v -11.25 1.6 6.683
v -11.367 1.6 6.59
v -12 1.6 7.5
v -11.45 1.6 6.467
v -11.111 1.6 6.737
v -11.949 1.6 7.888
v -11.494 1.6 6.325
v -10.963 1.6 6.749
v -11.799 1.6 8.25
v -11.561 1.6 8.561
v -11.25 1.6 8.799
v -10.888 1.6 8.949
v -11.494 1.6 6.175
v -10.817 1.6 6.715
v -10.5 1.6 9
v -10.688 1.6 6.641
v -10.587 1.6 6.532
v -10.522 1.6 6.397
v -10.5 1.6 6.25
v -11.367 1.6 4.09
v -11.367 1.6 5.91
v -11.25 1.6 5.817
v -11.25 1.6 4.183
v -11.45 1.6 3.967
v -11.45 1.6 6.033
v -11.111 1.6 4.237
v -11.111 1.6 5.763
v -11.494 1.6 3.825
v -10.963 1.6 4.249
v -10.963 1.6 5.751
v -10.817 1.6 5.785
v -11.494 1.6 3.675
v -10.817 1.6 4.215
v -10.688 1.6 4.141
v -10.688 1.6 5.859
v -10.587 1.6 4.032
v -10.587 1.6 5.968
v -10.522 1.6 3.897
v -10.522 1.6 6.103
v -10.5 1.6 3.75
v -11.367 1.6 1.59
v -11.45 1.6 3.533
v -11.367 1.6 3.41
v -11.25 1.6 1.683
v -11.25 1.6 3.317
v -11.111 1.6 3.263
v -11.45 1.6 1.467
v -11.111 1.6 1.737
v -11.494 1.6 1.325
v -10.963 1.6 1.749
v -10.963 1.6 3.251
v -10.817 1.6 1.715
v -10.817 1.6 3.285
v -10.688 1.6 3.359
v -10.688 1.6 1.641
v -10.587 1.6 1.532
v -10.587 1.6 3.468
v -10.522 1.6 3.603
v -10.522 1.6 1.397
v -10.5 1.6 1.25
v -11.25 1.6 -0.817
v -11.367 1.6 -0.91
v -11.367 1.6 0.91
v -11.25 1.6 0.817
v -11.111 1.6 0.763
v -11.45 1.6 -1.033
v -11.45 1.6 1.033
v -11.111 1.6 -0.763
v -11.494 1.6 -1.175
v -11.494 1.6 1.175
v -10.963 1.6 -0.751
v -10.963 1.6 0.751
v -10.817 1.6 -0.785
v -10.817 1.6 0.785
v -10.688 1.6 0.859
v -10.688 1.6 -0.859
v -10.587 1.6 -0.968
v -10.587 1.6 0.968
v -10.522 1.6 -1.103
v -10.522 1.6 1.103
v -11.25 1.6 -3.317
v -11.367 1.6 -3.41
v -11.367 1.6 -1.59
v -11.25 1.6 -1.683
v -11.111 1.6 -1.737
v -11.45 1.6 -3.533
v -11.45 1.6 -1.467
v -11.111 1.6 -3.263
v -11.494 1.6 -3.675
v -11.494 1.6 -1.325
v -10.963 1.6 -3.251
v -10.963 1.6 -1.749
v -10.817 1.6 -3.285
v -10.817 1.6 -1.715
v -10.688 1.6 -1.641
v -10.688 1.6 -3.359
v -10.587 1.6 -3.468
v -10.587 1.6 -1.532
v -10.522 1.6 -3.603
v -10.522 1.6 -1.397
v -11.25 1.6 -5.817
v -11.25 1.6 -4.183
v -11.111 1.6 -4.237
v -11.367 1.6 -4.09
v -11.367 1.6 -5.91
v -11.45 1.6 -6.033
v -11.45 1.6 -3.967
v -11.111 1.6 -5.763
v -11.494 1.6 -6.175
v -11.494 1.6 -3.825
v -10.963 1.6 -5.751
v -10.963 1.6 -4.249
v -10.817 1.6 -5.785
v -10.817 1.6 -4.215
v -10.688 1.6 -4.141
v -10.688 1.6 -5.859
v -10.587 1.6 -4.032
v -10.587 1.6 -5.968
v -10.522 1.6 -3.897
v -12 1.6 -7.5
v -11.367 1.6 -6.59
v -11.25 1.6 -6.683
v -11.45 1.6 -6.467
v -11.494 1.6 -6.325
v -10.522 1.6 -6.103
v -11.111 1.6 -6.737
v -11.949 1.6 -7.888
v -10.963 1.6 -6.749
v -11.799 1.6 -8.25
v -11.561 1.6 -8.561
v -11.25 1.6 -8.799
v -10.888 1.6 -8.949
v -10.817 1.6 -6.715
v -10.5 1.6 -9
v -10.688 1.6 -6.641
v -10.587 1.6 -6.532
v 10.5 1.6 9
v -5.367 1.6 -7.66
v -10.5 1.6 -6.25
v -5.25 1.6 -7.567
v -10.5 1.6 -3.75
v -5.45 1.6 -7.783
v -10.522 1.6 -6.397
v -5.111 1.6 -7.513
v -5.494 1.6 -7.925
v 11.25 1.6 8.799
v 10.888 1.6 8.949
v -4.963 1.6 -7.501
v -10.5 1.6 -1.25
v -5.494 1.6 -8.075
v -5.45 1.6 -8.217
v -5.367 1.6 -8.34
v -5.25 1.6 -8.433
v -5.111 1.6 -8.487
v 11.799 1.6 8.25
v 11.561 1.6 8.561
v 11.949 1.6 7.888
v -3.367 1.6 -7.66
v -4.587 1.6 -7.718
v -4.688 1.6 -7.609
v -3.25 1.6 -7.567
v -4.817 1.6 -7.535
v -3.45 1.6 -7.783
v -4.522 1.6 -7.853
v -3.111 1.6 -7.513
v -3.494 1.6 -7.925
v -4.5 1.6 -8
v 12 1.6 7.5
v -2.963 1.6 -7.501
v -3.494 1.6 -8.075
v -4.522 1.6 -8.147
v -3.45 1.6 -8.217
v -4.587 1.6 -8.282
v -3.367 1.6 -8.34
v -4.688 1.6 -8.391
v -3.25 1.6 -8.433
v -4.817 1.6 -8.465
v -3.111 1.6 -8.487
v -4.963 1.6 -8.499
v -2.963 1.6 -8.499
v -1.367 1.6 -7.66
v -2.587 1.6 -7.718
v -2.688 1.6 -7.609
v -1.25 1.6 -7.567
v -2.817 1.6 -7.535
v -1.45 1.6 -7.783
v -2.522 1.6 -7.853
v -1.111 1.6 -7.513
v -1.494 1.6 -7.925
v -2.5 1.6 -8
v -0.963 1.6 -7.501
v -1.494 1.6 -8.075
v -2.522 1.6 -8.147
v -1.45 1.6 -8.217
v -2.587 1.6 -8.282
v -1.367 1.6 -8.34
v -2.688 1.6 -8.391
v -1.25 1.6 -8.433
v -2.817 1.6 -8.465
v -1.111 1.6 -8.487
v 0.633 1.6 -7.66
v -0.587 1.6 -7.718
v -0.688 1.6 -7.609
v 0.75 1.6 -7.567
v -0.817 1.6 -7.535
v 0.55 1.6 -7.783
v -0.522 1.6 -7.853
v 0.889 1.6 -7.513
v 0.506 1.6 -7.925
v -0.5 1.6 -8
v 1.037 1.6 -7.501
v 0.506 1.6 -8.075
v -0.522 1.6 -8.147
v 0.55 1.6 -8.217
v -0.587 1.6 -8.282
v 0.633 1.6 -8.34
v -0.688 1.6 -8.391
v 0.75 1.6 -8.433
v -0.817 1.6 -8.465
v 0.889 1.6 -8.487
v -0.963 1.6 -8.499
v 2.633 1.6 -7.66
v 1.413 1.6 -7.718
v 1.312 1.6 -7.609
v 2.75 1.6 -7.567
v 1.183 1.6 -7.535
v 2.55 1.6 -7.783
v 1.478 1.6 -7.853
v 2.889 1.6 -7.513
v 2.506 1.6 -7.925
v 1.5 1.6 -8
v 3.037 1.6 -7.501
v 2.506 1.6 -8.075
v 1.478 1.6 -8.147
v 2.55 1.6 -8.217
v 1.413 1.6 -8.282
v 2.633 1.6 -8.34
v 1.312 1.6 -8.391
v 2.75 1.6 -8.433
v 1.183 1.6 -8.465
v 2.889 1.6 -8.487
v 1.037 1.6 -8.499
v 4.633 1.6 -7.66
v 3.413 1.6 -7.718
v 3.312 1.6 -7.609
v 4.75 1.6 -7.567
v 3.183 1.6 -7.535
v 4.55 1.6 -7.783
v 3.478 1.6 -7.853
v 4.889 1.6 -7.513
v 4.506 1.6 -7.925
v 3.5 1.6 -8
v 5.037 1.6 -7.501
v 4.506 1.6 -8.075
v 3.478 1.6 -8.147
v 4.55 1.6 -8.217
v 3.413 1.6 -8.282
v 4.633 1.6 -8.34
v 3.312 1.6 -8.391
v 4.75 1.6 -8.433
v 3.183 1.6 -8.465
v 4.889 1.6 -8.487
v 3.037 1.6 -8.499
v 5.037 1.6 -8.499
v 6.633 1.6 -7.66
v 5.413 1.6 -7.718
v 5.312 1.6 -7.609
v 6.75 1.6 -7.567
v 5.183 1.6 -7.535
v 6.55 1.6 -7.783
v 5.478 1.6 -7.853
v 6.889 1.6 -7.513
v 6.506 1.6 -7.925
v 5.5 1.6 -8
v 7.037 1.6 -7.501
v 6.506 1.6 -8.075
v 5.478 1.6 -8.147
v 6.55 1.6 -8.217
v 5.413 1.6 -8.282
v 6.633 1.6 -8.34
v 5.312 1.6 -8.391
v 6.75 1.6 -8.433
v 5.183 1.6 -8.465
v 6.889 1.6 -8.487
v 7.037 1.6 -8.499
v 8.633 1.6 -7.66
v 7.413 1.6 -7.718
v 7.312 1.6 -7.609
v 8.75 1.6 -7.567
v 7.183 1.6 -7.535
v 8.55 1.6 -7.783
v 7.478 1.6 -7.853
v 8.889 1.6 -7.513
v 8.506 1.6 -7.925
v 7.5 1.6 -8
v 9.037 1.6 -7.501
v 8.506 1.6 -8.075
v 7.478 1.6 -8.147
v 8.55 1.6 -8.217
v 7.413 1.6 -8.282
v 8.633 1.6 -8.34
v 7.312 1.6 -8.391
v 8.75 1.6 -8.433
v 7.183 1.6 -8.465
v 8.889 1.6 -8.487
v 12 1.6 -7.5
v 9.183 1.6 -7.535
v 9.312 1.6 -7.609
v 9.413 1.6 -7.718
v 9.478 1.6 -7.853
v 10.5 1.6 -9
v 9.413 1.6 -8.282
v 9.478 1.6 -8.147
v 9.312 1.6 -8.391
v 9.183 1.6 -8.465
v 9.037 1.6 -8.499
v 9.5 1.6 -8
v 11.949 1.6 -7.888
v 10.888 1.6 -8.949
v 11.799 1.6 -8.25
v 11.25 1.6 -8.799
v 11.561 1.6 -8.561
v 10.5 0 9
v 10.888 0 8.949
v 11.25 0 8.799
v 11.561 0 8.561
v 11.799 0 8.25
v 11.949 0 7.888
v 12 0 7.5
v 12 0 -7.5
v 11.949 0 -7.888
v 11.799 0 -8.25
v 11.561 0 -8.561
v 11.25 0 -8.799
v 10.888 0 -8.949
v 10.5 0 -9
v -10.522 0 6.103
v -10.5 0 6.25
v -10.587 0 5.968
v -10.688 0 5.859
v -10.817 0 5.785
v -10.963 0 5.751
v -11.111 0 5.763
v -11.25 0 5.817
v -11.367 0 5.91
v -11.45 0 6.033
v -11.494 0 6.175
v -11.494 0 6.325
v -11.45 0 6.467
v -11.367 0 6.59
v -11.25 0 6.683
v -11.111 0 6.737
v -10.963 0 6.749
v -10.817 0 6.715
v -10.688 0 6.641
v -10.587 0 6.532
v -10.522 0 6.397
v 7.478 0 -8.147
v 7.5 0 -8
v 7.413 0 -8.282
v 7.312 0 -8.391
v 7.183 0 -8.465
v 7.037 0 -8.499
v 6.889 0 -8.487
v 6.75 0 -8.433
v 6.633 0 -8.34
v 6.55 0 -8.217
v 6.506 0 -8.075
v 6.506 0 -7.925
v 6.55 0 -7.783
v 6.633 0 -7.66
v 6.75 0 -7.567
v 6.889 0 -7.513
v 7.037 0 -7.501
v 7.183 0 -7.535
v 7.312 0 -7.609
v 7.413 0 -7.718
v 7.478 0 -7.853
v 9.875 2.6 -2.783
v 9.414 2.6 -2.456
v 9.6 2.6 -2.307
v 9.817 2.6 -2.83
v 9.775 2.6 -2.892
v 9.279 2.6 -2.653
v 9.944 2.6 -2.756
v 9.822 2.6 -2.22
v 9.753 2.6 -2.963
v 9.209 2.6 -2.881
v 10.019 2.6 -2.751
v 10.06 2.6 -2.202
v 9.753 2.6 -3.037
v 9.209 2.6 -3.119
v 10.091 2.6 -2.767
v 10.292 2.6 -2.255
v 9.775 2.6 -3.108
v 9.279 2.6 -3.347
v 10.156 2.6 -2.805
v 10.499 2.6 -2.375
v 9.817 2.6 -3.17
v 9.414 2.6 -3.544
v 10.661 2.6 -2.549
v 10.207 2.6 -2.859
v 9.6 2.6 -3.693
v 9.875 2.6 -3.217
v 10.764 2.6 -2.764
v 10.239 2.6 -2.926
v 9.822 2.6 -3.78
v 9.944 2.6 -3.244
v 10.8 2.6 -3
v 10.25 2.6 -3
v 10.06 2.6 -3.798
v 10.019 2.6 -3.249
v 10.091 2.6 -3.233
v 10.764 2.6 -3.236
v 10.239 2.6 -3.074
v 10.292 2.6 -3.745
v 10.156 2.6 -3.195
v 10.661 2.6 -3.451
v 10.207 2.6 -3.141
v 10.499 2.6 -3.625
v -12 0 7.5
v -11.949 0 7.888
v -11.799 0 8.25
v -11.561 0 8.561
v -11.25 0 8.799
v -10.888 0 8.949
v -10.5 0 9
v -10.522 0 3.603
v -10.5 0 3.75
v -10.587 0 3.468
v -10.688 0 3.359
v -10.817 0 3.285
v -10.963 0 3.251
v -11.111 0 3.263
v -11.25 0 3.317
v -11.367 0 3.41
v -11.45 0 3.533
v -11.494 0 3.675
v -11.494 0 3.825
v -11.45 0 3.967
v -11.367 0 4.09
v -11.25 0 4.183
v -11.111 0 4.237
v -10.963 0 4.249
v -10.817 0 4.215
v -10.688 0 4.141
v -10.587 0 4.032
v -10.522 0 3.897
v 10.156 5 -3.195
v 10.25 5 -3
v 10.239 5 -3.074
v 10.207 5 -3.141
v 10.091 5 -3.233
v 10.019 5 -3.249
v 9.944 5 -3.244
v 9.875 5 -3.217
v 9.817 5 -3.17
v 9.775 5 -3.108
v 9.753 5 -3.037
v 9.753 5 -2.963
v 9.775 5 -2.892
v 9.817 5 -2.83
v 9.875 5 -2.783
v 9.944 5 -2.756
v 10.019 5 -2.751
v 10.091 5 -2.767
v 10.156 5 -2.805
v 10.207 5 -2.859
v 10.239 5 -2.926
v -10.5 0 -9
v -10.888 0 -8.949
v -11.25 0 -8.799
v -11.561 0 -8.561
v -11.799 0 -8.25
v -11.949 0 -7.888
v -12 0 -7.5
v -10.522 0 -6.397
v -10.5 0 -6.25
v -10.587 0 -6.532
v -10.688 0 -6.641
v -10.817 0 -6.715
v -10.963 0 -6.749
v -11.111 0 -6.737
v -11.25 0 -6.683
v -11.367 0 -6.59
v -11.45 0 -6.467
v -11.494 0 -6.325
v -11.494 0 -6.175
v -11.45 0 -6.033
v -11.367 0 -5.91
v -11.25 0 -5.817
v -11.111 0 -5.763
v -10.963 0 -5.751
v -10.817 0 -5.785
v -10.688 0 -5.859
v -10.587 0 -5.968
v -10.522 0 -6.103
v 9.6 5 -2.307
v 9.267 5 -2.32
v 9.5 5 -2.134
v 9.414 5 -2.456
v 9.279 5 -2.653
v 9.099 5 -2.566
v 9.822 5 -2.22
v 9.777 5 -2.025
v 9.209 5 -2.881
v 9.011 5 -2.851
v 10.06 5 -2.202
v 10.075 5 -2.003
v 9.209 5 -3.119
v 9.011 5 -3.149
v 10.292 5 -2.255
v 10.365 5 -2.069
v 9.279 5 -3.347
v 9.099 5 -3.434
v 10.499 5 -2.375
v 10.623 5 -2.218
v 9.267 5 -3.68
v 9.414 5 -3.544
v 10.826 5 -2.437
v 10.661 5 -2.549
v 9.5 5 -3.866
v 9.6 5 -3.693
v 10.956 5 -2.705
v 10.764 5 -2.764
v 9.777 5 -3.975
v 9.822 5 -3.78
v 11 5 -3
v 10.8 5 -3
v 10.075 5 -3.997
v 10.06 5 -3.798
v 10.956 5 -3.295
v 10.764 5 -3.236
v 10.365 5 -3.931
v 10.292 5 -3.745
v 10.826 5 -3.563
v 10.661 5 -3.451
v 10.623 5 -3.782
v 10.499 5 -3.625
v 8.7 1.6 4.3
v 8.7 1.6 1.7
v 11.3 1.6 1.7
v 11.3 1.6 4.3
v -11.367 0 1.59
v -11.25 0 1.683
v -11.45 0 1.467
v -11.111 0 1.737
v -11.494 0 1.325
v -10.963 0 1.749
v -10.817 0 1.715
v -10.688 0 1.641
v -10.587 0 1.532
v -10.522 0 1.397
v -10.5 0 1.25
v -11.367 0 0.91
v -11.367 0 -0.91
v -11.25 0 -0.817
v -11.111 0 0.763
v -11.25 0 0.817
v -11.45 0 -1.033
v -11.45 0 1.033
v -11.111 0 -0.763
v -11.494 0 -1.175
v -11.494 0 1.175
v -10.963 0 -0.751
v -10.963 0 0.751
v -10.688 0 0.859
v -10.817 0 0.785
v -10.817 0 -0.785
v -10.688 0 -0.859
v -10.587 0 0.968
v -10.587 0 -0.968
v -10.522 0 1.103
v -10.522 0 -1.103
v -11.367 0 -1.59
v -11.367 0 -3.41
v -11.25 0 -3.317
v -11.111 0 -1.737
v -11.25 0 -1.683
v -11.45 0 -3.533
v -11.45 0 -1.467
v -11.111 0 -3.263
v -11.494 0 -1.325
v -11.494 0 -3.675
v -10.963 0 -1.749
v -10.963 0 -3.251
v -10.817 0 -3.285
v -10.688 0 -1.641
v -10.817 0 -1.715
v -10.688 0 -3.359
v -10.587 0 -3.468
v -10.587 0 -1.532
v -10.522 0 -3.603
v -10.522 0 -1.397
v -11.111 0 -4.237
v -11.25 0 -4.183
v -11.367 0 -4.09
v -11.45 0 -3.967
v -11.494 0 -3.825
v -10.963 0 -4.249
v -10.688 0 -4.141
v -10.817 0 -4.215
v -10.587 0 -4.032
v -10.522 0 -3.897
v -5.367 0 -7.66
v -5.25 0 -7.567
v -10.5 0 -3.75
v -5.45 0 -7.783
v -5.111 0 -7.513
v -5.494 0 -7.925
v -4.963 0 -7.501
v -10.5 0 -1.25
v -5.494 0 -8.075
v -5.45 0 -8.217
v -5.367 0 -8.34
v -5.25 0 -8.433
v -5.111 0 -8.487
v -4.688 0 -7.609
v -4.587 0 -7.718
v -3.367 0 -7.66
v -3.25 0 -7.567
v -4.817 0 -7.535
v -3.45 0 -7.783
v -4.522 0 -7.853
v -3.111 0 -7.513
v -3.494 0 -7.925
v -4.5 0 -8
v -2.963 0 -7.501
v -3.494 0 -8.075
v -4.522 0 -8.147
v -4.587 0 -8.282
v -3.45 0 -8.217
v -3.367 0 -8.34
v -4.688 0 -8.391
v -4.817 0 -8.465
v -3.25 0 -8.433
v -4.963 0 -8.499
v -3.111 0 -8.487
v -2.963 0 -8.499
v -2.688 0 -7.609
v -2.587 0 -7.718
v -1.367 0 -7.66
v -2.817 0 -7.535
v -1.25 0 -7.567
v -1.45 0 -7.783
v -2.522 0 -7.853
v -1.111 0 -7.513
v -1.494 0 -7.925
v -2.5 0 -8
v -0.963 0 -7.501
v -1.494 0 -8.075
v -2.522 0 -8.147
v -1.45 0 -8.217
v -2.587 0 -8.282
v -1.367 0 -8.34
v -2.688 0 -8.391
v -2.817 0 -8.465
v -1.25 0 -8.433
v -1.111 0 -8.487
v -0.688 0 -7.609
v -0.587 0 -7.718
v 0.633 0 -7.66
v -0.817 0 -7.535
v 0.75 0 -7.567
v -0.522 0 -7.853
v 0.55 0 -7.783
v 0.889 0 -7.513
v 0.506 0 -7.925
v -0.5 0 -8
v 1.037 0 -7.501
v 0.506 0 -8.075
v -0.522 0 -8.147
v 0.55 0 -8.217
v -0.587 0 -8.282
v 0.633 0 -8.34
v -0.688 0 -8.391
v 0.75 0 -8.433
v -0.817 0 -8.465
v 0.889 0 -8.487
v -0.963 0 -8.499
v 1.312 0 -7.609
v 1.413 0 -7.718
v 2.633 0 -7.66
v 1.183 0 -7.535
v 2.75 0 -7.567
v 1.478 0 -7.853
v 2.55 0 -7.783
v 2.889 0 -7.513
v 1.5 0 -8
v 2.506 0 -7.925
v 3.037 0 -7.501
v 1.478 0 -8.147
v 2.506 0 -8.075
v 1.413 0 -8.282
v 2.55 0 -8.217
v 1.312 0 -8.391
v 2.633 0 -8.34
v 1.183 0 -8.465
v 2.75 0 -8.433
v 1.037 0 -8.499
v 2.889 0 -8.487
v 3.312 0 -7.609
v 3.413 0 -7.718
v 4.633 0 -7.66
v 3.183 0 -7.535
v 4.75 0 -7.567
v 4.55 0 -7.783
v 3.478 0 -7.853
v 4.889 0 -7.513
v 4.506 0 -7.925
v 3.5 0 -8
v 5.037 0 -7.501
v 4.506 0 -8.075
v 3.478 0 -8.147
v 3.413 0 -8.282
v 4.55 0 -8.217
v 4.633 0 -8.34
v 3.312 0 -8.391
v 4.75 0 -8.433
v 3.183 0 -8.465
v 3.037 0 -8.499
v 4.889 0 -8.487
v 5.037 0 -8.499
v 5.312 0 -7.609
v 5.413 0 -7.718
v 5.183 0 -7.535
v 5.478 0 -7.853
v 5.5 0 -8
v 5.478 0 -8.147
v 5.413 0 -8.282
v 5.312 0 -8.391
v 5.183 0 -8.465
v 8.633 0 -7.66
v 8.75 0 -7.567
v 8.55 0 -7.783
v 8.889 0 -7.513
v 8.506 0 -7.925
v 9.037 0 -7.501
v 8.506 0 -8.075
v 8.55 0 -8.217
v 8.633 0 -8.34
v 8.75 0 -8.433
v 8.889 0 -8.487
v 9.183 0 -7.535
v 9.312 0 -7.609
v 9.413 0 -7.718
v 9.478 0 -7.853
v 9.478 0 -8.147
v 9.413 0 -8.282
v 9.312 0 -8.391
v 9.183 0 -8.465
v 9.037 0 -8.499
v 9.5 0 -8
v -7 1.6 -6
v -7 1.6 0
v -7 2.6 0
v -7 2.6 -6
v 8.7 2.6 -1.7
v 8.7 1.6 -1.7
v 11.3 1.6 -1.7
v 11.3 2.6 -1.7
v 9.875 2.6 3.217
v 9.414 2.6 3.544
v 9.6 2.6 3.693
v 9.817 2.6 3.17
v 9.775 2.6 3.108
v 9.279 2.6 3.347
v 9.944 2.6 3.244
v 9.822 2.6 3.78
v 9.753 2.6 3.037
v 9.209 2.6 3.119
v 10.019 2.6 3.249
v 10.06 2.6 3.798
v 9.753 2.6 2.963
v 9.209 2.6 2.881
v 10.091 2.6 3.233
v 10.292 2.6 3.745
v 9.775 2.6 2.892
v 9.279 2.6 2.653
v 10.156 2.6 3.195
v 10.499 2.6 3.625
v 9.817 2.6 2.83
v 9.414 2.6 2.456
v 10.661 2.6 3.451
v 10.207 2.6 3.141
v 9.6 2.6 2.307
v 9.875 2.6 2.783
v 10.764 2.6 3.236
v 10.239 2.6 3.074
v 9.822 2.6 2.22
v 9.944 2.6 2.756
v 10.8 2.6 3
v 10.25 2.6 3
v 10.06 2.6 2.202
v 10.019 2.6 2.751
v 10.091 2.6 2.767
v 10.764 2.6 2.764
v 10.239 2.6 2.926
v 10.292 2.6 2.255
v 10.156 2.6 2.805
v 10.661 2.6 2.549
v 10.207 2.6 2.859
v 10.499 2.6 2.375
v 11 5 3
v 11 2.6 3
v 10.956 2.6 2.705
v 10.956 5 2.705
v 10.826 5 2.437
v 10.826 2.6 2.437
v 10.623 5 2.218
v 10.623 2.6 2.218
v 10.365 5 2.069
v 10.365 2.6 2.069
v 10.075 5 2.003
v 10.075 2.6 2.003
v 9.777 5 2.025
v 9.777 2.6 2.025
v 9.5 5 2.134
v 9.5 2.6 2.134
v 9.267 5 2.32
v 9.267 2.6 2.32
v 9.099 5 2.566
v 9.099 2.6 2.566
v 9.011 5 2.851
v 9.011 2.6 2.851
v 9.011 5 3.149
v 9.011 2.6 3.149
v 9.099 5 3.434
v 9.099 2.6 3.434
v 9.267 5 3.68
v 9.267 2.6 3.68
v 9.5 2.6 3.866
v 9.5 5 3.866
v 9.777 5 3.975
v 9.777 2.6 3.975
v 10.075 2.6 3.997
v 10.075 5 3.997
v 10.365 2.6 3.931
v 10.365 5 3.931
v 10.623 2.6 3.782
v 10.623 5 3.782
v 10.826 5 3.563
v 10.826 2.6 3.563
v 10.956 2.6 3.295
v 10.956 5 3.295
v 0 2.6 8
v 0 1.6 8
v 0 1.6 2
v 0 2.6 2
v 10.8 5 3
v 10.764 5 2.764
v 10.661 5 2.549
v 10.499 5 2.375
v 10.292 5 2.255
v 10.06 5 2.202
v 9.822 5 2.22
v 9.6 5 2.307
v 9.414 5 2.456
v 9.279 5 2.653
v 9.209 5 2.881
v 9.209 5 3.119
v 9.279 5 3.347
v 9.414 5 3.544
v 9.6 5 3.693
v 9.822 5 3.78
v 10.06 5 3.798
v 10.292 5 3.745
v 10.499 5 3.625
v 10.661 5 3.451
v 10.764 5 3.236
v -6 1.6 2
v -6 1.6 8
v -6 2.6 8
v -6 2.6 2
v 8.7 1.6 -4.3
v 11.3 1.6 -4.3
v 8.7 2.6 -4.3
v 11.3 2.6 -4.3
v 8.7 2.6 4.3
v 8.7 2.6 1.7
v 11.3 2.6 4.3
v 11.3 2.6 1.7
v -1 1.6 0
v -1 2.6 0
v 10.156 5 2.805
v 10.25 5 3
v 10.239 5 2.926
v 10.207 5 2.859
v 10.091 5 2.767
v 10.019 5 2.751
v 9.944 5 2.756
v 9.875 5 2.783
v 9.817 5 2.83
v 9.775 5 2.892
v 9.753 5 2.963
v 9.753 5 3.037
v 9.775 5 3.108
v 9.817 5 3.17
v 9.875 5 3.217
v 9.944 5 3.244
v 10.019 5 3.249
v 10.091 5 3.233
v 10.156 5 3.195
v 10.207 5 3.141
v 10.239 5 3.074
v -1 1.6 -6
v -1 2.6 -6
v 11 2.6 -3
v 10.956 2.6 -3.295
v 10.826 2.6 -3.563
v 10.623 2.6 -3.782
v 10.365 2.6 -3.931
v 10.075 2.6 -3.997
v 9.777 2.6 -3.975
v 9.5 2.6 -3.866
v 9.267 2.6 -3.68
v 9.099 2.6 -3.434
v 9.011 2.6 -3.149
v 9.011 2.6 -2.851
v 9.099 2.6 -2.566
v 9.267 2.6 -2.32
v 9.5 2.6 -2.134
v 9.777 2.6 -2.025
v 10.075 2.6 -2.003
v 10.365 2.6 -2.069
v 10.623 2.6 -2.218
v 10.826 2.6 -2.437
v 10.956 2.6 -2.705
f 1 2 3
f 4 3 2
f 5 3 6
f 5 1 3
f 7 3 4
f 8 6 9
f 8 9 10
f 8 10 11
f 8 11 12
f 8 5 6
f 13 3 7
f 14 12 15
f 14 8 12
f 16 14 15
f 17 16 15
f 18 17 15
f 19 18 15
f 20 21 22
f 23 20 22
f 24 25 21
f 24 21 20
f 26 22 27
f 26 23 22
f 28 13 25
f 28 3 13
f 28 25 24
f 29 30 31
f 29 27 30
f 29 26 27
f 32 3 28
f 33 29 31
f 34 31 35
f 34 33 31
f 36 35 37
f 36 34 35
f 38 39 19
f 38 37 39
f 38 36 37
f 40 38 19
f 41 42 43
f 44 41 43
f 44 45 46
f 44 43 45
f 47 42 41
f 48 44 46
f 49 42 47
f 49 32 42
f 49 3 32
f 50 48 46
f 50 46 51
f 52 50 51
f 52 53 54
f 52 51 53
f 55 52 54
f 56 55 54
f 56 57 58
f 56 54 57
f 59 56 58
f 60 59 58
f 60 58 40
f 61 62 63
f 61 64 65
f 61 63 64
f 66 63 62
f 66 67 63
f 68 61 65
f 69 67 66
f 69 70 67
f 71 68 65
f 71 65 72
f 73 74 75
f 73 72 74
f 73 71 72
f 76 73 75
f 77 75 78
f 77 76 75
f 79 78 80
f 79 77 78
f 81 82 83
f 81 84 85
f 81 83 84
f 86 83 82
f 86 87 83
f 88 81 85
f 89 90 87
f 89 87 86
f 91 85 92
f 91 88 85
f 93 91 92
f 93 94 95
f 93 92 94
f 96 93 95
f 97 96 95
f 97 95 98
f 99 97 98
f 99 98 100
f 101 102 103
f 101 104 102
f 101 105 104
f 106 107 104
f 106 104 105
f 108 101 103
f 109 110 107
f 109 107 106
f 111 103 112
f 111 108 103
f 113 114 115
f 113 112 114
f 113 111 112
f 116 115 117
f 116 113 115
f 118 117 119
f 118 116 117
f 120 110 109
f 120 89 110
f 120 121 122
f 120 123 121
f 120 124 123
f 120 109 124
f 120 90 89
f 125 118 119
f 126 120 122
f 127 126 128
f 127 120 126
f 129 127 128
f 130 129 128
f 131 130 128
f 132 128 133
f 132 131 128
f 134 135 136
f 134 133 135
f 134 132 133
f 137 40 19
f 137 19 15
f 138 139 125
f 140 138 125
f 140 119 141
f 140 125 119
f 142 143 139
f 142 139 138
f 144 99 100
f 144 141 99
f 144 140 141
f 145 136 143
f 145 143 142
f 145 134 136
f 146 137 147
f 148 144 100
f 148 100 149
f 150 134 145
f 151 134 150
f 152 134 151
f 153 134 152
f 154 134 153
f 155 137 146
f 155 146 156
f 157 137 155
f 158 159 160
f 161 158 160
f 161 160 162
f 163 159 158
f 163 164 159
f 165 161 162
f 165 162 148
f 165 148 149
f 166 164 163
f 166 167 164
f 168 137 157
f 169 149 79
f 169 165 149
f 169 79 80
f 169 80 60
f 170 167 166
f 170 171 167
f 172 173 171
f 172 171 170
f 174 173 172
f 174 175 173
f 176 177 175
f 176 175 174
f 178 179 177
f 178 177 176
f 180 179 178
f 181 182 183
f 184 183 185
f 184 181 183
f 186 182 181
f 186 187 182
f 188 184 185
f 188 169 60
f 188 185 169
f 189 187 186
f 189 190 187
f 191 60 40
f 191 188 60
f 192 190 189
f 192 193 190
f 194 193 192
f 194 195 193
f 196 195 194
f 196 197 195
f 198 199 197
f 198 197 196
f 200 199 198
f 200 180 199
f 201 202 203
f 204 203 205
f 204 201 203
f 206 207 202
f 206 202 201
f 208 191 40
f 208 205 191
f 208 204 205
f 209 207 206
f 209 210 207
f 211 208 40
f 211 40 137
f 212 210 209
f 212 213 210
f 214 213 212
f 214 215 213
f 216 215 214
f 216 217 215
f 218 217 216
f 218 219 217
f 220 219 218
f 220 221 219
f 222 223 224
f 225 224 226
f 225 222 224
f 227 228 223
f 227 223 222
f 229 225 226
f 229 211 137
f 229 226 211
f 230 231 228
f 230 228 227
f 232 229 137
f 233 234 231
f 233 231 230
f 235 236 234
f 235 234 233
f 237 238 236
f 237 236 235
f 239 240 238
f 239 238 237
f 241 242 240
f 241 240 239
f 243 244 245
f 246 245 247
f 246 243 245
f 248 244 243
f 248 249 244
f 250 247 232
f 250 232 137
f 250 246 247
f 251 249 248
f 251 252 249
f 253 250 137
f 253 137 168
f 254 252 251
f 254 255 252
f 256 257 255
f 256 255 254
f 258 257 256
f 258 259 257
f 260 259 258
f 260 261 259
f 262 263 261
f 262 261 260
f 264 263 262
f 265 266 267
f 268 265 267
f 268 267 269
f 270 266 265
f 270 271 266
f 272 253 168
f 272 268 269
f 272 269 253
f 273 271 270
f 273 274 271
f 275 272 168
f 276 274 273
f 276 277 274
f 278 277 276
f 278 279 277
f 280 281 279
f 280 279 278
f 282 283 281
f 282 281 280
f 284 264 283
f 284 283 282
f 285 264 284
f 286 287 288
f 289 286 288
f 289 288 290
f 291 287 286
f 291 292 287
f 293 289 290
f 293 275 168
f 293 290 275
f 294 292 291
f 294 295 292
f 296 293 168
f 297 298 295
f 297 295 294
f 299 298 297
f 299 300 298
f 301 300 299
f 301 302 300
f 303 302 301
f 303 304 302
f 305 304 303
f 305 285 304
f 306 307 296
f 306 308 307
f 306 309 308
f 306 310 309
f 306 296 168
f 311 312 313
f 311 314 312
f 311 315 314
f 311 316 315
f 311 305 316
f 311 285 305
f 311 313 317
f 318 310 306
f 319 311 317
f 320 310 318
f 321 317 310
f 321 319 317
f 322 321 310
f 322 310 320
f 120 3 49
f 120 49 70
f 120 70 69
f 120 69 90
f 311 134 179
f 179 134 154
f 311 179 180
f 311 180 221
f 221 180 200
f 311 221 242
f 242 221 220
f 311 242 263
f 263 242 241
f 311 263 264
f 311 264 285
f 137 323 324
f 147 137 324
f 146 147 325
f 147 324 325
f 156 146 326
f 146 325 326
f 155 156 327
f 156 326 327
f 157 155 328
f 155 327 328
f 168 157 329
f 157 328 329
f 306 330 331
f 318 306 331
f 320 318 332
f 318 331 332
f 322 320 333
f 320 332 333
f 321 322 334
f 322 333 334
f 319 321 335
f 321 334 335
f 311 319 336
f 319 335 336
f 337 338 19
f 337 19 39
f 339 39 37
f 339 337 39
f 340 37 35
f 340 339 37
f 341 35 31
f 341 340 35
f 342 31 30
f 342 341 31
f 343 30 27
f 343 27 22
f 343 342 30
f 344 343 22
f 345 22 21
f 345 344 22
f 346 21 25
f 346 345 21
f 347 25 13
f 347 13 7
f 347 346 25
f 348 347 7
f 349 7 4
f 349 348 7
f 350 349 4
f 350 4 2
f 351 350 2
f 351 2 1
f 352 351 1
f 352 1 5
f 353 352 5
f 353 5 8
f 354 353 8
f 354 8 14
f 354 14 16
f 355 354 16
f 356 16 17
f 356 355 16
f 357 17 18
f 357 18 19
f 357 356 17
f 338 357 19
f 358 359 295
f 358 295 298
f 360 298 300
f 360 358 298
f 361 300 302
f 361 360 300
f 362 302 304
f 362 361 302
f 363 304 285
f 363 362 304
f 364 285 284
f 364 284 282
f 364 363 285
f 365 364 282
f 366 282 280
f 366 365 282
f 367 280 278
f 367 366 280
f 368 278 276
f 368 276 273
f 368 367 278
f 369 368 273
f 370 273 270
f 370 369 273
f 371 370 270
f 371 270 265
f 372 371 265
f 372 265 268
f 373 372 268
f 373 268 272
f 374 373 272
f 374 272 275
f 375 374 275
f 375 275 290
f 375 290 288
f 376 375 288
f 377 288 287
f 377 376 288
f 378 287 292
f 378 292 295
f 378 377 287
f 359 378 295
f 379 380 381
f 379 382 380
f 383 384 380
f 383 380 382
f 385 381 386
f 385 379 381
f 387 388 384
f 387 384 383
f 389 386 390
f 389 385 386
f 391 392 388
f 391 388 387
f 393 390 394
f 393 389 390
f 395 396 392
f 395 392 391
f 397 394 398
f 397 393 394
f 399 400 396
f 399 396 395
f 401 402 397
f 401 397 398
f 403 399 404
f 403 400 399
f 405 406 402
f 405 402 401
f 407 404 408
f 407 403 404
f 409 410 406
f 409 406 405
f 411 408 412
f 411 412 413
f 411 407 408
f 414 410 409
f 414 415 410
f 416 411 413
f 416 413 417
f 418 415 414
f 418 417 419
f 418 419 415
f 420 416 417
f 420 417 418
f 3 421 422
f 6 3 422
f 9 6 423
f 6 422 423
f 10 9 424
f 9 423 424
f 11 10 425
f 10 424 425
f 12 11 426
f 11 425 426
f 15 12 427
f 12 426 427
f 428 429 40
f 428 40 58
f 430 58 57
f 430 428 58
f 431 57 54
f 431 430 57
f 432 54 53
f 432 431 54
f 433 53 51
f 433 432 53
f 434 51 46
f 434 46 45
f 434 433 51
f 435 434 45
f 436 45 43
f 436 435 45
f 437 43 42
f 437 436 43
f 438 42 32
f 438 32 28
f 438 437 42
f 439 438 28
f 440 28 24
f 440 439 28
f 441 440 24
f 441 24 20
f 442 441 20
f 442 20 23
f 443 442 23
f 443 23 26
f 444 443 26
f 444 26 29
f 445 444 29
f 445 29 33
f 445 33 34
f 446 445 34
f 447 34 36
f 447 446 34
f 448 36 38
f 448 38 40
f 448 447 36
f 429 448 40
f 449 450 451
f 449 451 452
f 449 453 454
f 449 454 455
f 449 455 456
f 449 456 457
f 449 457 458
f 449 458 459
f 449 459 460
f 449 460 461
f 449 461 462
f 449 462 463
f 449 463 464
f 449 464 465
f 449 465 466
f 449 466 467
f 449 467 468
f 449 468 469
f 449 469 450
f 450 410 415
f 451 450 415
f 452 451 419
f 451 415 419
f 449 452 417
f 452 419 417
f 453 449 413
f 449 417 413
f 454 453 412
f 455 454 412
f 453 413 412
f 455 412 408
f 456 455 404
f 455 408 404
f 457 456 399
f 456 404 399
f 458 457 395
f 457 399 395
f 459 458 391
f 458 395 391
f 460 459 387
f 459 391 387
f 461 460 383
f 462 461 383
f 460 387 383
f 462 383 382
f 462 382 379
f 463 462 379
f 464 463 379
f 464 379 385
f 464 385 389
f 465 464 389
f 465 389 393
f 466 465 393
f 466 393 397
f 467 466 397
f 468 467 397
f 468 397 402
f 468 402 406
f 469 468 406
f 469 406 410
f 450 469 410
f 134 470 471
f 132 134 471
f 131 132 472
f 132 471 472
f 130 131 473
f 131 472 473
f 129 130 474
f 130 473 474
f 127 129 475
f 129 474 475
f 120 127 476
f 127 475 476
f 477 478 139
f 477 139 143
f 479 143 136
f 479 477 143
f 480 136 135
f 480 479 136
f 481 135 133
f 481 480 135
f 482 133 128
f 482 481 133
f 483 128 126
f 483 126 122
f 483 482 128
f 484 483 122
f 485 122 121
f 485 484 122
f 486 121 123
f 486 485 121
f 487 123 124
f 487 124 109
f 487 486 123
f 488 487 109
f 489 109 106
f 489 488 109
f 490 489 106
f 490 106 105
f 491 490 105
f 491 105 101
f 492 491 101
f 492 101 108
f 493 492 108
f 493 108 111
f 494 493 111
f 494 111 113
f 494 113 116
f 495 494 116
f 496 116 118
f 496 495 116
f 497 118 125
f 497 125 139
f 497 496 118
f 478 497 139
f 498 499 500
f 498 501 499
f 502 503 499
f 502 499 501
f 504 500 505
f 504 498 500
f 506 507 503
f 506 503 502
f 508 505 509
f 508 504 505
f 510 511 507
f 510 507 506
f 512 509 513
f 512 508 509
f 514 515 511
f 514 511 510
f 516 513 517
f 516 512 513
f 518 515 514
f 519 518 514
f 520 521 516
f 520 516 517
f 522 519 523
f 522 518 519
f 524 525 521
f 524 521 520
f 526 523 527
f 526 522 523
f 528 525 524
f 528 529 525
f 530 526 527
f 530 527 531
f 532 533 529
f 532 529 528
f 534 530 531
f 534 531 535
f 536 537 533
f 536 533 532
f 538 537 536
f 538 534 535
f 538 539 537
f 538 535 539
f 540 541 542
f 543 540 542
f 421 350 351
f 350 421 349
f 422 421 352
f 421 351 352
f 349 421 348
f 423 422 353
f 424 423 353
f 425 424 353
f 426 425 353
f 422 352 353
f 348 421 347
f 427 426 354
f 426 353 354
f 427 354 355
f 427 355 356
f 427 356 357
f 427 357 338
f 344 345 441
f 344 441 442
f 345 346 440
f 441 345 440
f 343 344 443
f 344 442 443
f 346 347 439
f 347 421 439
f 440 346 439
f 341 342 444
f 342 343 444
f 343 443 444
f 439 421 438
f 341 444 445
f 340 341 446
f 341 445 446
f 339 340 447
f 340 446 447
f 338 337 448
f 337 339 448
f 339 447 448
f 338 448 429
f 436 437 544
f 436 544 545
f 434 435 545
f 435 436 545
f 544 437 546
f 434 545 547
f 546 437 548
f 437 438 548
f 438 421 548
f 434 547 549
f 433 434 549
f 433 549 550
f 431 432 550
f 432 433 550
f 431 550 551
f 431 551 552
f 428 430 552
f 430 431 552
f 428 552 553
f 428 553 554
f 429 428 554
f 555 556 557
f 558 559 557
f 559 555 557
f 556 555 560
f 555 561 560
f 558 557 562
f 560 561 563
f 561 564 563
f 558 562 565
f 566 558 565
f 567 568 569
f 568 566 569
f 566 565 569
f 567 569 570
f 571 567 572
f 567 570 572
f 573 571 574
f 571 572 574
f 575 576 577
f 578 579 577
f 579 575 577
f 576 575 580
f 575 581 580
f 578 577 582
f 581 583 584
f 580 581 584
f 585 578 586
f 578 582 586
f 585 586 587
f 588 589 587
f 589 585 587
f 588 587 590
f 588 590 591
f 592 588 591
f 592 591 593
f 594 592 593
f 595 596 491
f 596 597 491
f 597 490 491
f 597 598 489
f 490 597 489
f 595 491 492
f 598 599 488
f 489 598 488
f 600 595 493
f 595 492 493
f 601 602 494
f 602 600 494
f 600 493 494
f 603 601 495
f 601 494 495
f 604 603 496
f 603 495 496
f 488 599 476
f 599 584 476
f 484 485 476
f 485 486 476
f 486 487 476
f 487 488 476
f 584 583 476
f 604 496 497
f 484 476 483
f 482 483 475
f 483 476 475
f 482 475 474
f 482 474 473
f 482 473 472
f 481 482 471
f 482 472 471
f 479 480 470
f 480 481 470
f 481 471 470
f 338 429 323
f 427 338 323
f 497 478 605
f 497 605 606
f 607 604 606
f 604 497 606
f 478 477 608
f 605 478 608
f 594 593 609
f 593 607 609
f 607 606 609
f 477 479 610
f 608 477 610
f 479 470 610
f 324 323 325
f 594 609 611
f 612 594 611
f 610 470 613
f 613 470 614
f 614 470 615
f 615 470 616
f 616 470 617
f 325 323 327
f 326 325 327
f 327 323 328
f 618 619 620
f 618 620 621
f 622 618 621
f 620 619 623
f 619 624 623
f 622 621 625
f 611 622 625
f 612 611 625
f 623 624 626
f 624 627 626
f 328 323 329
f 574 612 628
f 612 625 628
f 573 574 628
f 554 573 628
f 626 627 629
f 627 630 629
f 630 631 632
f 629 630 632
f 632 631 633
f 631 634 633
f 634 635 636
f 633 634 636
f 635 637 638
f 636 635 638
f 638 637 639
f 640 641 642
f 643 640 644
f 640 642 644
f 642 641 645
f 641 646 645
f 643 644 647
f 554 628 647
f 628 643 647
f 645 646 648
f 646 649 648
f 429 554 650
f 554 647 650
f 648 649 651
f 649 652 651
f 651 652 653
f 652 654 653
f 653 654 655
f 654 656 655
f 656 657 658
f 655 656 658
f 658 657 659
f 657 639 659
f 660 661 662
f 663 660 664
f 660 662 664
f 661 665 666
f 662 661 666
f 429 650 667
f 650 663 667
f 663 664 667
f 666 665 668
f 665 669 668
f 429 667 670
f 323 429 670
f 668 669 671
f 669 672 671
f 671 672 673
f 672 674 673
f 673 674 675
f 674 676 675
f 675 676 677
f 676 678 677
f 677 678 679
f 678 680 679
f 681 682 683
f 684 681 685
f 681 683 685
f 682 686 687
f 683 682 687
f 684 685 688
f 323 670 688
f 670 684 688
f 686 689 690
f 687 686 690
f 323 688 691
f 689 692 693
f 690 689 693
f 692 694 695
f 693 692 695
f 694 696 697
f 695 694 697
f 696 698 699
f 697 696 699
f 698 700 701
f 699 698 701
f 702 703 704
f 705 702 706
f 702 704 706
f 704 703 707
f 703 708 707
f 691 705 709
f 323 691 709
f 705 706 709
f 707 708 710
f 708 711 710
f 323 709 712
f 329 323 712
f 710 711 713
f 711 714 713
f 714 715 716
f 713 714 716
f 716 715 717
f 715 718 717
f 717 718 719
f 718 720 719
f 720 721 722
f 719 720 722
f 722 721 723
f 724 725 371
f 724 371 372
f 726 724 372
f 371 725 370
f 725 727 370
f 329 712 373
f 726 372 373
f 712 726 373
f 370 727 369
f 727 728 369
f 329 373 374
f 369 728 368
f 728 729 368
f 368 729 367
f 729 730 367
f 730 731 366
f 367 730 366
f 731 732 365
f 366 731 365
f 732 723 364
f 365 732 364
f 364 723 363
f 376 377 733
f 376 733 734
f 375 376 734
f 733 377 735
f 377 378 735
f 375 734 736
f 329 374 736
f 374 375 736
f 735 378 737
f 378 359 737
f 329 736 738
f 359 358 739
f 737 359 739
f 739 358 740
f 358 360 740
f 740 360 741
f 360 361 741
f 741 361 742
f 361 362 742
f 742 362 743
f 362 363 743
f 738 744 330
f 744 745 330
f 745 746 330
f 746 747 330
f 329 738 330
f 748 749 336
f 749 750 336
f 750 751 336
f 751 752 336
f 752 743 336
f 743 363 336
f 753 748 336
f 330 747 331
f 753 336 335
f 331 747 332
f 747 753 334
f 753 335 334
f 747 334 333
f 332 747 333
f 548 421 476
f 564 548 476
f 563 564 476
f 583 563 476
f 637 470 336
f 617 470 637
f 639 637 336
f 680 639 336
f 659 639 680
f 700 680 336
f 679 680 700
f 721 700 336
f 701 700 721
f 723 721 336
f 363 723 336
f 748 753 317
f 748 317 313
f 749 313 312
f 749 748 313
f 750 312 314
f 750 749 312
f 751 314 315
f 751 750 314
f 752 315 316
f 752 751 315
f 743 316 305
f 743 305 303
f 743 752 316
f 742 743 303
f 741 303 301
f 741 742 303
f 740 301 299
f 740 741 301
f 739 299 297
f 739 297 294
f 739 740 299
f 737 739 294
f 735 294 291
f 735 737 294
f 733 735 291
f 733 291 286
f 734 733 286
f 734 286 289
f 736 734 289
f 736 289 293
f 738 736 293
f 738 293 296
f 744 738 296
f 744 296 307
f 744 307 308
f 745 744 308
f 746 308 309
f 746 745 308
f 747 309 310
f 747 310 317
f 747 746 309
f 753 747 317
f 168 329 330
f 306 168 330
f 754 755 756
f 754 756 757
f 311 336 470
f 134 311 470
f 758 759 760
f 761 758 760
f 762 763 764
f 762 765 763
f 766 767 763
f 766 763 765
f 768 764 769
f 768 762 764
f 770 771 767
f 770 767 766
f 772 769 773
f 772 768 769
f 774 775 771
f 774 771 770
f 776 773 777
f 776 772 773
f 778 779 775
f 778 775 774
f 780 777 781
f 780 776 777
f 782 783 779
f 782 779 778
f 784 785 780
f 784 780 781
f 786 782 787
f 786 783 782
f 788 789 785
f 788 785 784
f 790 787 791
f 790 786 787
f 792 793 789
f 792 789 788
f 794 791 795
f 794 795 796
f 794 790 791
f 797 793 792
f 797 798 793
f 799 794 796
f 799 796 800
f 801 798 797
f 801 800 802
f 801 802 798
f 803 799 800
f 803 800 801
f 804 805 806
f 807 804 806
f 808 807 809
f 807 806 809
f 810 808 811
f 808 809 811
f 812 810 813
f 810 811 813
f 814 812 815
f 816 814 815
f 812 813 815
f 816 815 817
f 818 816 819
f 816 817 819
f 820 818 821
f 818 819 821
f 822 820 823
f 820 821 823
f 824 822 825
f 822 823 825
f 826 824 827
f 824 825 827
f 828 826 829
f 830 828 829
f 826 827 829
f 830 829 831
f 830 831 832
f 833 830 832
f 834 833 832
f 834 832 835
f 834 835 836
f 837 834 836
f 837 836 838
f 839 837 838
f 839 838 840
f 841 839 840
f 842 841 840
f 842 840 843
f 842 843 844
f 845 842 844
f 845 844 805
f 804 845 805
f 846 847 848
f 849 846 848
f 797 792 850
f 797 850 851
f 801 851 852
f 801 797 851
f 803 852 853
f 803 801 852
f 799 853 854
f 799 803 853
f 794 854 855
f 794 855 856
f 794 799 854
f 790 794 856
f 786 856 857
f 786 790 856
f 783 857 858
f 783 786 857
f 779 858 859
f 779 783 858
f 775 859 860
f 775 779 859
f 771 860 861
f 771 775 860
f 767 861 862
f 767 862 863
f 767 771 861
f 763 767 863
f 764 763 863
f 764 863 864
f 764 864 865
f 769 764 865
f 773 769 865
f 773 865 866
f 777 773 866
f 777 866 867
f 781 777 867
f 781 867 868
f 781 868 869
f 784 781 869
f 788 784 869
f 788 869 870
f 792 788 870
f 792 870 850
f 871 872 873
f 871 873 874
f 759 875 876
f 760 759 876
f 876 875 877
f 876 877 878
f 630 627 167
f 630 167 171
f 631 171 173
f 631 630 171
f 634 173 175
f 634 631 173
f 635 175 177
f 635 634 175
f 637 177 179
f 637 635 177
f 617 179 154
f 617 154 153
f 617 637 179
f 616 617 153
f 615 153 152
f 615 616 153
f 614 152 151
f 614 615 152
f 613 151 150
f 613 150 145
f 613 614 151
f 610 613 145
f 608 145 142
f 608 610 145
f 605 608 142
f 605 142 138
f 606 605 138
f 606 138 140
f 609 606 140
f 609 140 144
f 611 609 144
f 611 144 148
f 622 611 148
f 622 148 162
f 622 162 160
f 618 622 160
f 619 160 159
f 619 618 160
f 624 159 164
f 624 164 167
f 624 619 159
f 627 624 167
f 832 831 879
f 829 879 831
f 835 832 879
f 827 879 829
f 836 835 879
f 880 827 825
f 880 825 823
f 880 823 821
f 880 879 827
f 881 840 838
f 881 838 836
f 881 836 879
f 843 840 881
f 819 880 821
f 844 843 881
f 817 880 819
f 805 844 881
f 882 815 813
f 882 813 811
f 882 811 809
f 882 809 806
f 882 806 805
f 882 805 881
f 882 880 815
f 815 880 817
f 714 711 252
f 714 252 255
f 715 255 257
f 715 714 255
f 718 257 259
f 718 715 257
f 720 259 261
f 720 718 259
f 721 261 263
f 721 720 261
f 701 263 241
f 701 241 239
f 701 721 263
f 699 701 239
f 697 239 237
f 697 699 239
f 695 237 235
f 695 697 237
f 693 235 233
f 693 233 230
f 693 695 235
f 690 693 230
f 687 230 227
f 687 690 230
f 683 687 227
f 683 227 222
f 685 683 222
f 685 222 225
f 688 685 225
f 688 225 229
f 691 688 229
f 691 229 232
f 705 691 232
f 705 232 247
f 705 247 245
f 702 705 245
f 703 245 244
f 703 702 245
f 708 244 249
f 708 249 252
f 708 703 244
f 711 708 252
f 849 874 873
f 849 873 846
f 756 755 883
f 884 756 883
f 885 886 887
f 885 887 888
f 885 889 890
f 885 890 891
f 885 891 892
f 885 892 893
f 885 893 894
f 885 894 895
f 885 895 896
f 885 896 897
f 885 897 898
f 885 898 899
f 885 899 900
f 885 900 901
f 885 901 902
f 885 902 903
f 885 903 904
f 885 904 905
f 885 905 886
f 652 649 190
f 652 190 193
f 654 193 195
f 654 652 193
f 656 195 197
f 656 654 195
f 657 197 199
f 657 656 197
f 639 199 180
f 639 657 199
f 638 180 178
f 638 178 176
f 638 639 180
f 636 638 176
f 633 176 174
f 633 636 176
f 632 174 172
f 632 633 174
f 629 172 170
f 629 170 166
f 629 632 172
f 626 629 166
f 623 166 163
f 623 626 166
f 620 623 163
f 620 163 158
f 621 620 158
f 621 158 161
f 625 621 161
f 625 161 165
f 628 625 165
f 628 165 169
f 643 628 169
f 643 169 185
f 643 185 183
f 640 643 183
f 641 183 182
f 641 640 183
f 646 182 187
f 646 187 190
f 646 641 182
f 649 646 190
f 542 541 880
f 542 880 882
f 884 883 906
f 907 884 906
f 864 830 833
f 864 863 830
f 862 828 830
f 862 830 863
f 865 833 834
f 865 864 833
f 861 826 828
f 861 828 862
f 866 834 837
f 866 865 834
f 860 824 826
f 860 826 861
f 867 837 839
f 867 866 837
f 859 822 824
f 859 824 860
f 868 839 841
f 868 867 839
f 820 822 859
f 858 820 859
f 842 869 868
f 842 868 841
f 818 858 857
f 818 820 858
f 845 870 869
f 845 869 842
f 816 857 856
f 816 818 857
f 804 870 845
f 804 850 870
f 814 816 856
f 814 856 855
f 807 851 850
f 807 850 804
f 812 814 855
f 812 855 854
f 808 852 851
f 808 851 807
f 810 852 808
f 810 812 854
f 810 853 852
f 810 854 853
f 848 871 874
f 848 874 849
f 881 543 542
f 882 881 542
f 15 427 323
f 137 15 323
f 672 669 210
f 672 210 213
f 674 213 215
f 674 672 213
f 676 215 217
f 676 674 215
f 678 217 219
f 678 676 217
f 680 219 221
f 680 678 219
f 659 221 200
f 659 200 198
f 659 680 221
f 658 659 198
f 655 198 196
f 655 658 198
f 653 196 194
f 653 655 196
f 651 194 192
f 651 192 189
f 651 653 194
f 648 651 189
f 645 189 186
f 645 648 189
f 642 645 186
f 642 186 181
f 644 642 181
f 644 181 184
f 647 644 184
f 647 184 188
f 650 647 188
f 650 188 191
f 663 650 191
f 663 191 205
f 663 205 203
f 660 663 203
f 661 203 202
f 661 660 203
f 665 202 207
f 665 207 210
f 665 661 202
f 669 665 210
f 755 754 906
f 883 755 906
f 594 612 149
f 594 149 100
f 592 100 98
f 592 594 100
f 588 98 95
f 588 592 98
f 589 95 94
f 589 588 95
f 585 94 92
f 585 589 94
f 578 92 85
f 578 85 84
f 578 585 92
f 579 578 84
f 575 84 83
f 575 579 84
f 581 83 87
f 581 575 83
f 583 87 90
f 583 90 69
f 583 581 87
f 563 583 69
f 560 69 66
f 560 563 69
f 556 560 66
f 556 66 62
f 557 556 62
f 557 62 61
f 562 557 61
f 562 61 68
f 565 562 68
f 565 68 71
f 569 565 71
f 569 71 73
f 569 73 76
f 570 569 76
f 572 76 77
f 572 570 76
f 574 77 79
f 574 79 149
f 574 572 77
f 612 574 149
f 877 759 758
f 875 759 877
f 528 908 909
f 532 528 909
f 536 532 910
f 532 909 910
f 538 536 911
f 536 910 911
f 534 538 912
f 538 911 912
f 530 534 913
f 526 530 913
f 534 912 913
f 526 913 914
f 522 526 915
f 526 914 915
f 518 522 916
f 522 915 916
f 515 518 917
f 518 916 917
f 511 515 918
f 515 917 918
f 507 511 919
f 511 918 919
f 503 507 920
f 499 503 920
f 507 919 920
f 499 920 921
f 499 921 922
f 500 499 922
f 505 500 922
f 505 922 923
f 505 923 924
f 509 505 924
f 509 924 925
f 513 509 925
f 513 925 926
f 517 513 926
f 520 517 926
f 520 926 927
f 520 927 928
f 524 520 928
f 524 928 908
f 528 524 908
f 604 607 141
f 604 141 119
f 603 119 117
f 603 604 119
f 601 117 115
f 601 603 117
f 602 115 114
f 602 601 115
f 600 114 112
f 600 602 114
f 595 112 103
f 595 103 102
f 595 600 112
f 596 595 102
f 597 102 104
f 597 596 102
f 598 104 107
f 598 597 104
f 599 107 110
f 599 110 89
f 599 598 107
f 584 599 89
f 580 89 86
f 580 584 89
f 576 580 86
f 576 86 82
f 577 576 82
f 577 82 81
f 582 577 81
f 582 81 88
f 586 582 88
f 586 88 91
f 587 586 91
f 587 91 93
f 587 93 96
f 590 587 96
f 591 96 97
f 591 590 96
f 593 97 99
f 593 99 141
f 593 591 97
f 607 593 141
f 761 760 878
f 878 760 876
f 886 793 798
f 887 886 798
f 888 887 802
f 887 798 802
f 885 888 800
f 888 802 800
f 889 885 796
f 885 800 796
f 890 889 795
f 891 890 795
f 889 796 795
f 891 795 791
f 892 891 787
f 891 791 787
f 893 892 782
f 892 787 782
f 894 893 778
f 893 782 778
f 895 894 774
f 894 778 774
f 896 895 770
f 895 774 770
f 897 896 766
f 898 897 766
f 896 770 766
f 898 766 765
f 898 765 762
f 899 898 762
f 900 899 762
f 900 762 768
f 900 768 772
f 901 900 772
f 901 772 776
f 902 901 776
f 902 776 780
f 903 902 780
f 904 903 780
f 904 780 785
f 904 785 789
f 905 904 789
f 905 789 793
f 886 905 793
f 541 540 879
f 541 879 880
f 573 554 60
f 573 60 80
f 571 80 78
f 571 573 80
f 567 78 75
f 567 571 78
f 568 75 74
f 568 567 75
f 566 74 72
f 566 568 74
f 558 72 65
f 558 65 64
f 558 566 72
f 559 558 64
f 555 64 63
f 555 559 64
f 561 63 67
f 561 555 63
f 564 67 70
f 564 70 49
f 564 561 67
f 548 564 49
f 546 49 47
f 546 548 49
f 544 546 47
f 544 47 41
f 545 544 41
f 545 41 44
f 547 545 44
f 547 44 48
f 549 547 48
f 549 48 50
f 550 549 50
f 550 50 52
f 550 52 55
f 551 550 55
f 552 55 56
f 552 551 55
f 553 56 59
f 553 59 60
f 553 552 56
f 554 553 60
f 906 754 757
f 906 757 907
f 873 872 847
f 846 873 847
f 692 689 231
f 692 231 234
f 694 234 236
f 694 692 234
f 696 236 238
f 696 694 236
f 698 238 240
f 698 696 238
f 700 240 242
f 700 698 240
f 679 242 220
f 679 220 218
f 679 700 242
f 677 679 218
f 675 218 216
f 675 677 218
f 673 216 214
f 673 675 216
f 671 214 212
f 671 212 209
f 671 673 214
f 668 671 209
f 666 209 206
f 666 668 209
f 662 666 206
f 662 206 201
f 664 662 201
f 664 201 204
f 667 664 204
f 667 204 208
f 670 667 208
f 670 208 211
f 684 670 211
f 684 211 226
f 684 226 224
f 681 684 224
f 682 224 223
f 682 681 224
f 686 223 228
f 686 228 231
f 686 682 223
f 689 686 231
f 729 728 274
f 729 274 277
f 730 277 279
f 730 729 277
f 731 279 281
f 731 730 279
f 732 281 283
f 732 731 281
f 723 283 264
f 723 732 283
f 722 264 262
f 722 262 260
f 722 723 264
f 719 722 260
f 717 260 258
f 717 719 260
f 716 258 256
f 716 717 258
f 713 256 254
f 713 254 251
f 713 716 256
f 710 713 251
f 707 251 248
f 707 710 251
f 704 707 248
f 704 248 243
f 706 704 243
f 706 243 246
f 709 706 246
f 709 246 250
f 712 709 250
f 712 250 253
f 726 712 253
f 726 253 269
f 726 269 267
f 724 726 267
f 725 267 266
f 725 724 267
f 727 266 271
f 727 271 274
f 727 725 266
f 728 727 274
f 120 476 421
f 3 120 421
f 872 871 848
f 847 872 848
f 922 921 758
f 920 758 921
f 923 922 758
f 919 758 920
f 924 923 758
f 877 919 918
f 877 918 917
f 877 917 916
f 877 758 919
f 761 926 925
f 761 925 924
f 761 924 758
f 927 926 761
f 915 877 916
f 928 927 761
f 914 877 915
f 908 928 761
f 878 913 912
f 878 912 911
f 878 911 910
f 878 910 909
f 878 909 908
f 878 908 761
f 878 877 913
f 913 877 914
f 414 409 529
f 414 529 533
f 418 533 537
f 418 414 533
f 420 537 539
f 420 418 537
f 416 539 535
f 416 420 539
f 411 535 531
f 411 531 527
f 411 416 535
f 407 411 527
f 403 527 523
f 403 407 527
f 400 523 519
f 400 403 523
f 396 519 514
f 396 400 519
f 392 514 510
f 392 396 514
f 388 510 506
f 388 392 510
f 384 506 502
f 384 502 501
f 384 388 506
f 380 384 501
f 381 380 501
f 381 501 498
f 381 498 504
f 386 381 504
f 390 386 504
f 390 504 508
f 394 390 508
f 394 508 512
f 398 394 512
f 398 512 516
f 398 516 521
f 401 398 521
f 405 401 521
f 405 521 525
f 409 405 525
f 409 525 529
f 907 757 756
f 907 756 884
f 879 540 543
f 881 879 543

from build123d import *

# Parameters (mm, degrees)
SKETCH1_R             = 0.5
BOSS_EXTRUDE1_DEPTH   = 1.6
SKETCH2_W             = 6
SKETCH2_H             = 6
BOSS_EXTRUDE2_DEPTH   = 1
BOSS_EXTRUDE2_2_DEPTH = 1
SKETCH3_R             = 1
SKETCH3_R_2           = 0.8
BOSS_EXTRUDE3_DEPTH   = 3.4
SKETCH3_R_3           = 0.25
BOSS_EXTRUDE3_2_DEPTH = 3.4
BOSS_EXTRUDE3_3_DEPTH = 3.4
BOSS_EXTRUDE3_4_DEPTH = 3.4
SKETCH4_W             = 2.6
SKETCH4_H             = 2.6
BOSS_EXTRUDE4_DEPTH   = 1
BOSS_EXTRUDE4_2_DEPTH = 1


with BuildPart() as part:
    # Sketch1 → Boss-Extrude1 (new body)
    with BuildSketch(Plane(origin=(0, 0, 0), x_dir=(1, 0, 0), z_dir=(0, 1, 0))):
        with BuildLine():
            Line((-12, 7.5), (-12, -7.5))
            ThreePointArc((-12, -7.5), (-11.560660172, -8.560660172), (-10.5, -9))
            Line((-10.5, -9), (10.5, -9))
            ThreePointArc((10.5, -9), (11.560660172, -8.560660172), (12, -7.5))
            Line((12, -7.5), (12, 7.5))
            ThreePointArc((12, 7.5), (11.560660172, 8.560660172), (10.5, 9))
            Line((10.5, 9), (-10.5, 9))
            ThreePointArc((-10.5, 9), (-11.560660172, 8.560660172), (-12, 7.5))
        make_face()
        with Locations((-11, 6.25)):
            Circle(SKETCH1_R, mode=Mode.SUBTRACT)
        with Locations((-11, 3.75)):
            Circle(SKETCH1_R, mode=Mode.SUBTRACT)
        with Locations((-11, 1.25)):
            Circle(SKETCH1_R, mode=Mode.SUBTRACT)
        with Locations((-11, -1.25)):
            Circle(SKETCH1_R, mode=Mode.SUBTRACT)
        with Locations((-11, -3.75)):
            Circle(SKETCH1_R, mode=Mode.SUBTRACT)
        with Locations((-11, -6.25)):
            Circle(SKETCH1_R, mode=Mode.SUBTRACT)
        with Locations((9, 8)):
            Circle(SKETCH1_R, mode=Mode.SUBTRACT)
        with Locations((7, 8)):
            Circle(SKETCH1_R, mode=Mode.SUBTRACT)
        with Locations((5, 8)):
            Circle(SKETCH1_R, mode=Mode.SUBTRACT)
        with Locations((3, 8)):
            Circle(SKETCH1_R, mode=Mode.SUBTRACT)
        with Locations((1, 8)):
            Circle(SKETCH1_R, mode=Mode.SUBTRACT)
        with Locations((-1, 8)):
            Circle(SKETCH1_R, mode=Mode.SUBTRACT)
        with Locations((-3, 8)):
            Circle(SKETCH1_R, mode=Mode.SUBTRACT)
        with Locations((-5, 8)):
            Circle(SKETCH1_R, mode=Mode.SUBTRACT)
    extrude(amount=BOSS_EXTRUDE1_DEPTH)


with BuildPart() as body_2:
    # Sketch2 → Boss-Extrude2 (new body)
    with BuildSketch(Plane(origin=(0, 1.6, 0), x_dir=(1, 0, 0), z_dir=(0, 1, 0))):
        with Locations((-4, 3)):
            Rectangle(SKETCH2_W, SKETCH2_H)
    extrude(amount=BOSS_EXTRUDE2_DEPTH)


with BuildPart() as body_3:
    # Sketch2 → Boss-Extrude2 2 (new body)
    with BuildSketch(Plane(origin=(0, 1.6, 0), x_dir=(1, 0, 0), z_dir=(0, 1, 0))):
        with Locations((-3, -5)):
            Rectangle(SKETCH2_W, SKETCH2_H)
    extrude(amount=BOSS_EXTRUDE2_2_DEPTH)


with BuildPart() as body_4:
    # Sketch3 → Boss-Extrude3 (new body)
    with BuildSketch(Plane(origin=(0, 1.6, 0), x_dir=(1, 0, 0), z_dir=(0, 1, 0))):
        with Locations((10, -3)):
            Circle(SKETCH3_R)
        with Locations((10, -3)):
            Circle(SKETCH3_R_2, mode=Mode.SUBTRACT)
    extrude(amount=BOSS_EXTRUDE3_DEPTH)


with BuildPart() as body_5:
    # Sketch3 → Boss-Extrude3 2 (new body)
    with BuildSketch(Plane(origin=(0, 1.6, 0), x_dir=(1, 0, 0), z_dir=(0, 1, 0))):
        with Locations((10, -3)):
            Circle(SKETCH3_R_3)
    extrude(amount=BOSS_EXTRUDE3_2_DEPTH)


with BuildPart() as body_6:
    # Sketch3 → Boss-Extrude3 3 (new body)
    with BuildSketch(Plane(origin=(0, 1.6, 0), x_dir=(1, 0, 0), z_dir=(0, 1, 0))):
        with Locations((10, 3)):
            Circle(SKETCH3_R)
        with Locations((10, 3)):
            Circle(SKETCH3_R_2, mode=Mode.SUBTRACT)
    extrude(amount=BOSS_EXTRUDE3_3_DEPTH)


with BuildPart() as body_7:
    # Sketch3 → Boss-Extrude3 4 (new body)
    with BuildSketch(Plane(origin=(0, 1.6, 0), x_dir=(1, 0, 0), z_dir=(0, 1, 0))):
        with Locations((10, 3)):
            Circle(SKETCH3_R_3)
    extrude(amount=BOSS_EXTRUDE3_4_DEPTH)


with BuildPart() as body_8:
    # Sketch4 → Boss-Extrude4 (new body)
    with BuildSketch(Plane(origin=(0, 1.6, 0), x_dir=(1, 0, 0), z_dir=(0, 1, 0))):
        with Locations((10, 3)):
            Rectangle(SKETCH4_W, SKETCH4_H)
    extrude(amount=BOSS_EXTRUDE4_DEPTH)


with BuildPart() as body_9:
    # Sketch4 → Boss-Extrude4 2 (new body)
    with BuildSketch(Plane(origin=(0, 1.6, 0), x_dir=(1, 0, 0), z_dir=(0, 1, 0))):
        with Locations((10, -3)):
            Rectangle(SKETCH4_W, SKETCH4_H)
    extrude(amount=BOSS_EXTRUDE4_2_DEPTH)

    # Combine3: union body 4, body 5
    add(body_4.part)
    add(body_5.part)


with BuildPart() as body_6_1:
    add(body_6.part)

    # Combine2: union body 8, body 7
    add(body_8.part)
    add(body_7.part)


solid = Compound([part.part, body_2.part, body_3.part, body_9.part, body_6_1.part])
